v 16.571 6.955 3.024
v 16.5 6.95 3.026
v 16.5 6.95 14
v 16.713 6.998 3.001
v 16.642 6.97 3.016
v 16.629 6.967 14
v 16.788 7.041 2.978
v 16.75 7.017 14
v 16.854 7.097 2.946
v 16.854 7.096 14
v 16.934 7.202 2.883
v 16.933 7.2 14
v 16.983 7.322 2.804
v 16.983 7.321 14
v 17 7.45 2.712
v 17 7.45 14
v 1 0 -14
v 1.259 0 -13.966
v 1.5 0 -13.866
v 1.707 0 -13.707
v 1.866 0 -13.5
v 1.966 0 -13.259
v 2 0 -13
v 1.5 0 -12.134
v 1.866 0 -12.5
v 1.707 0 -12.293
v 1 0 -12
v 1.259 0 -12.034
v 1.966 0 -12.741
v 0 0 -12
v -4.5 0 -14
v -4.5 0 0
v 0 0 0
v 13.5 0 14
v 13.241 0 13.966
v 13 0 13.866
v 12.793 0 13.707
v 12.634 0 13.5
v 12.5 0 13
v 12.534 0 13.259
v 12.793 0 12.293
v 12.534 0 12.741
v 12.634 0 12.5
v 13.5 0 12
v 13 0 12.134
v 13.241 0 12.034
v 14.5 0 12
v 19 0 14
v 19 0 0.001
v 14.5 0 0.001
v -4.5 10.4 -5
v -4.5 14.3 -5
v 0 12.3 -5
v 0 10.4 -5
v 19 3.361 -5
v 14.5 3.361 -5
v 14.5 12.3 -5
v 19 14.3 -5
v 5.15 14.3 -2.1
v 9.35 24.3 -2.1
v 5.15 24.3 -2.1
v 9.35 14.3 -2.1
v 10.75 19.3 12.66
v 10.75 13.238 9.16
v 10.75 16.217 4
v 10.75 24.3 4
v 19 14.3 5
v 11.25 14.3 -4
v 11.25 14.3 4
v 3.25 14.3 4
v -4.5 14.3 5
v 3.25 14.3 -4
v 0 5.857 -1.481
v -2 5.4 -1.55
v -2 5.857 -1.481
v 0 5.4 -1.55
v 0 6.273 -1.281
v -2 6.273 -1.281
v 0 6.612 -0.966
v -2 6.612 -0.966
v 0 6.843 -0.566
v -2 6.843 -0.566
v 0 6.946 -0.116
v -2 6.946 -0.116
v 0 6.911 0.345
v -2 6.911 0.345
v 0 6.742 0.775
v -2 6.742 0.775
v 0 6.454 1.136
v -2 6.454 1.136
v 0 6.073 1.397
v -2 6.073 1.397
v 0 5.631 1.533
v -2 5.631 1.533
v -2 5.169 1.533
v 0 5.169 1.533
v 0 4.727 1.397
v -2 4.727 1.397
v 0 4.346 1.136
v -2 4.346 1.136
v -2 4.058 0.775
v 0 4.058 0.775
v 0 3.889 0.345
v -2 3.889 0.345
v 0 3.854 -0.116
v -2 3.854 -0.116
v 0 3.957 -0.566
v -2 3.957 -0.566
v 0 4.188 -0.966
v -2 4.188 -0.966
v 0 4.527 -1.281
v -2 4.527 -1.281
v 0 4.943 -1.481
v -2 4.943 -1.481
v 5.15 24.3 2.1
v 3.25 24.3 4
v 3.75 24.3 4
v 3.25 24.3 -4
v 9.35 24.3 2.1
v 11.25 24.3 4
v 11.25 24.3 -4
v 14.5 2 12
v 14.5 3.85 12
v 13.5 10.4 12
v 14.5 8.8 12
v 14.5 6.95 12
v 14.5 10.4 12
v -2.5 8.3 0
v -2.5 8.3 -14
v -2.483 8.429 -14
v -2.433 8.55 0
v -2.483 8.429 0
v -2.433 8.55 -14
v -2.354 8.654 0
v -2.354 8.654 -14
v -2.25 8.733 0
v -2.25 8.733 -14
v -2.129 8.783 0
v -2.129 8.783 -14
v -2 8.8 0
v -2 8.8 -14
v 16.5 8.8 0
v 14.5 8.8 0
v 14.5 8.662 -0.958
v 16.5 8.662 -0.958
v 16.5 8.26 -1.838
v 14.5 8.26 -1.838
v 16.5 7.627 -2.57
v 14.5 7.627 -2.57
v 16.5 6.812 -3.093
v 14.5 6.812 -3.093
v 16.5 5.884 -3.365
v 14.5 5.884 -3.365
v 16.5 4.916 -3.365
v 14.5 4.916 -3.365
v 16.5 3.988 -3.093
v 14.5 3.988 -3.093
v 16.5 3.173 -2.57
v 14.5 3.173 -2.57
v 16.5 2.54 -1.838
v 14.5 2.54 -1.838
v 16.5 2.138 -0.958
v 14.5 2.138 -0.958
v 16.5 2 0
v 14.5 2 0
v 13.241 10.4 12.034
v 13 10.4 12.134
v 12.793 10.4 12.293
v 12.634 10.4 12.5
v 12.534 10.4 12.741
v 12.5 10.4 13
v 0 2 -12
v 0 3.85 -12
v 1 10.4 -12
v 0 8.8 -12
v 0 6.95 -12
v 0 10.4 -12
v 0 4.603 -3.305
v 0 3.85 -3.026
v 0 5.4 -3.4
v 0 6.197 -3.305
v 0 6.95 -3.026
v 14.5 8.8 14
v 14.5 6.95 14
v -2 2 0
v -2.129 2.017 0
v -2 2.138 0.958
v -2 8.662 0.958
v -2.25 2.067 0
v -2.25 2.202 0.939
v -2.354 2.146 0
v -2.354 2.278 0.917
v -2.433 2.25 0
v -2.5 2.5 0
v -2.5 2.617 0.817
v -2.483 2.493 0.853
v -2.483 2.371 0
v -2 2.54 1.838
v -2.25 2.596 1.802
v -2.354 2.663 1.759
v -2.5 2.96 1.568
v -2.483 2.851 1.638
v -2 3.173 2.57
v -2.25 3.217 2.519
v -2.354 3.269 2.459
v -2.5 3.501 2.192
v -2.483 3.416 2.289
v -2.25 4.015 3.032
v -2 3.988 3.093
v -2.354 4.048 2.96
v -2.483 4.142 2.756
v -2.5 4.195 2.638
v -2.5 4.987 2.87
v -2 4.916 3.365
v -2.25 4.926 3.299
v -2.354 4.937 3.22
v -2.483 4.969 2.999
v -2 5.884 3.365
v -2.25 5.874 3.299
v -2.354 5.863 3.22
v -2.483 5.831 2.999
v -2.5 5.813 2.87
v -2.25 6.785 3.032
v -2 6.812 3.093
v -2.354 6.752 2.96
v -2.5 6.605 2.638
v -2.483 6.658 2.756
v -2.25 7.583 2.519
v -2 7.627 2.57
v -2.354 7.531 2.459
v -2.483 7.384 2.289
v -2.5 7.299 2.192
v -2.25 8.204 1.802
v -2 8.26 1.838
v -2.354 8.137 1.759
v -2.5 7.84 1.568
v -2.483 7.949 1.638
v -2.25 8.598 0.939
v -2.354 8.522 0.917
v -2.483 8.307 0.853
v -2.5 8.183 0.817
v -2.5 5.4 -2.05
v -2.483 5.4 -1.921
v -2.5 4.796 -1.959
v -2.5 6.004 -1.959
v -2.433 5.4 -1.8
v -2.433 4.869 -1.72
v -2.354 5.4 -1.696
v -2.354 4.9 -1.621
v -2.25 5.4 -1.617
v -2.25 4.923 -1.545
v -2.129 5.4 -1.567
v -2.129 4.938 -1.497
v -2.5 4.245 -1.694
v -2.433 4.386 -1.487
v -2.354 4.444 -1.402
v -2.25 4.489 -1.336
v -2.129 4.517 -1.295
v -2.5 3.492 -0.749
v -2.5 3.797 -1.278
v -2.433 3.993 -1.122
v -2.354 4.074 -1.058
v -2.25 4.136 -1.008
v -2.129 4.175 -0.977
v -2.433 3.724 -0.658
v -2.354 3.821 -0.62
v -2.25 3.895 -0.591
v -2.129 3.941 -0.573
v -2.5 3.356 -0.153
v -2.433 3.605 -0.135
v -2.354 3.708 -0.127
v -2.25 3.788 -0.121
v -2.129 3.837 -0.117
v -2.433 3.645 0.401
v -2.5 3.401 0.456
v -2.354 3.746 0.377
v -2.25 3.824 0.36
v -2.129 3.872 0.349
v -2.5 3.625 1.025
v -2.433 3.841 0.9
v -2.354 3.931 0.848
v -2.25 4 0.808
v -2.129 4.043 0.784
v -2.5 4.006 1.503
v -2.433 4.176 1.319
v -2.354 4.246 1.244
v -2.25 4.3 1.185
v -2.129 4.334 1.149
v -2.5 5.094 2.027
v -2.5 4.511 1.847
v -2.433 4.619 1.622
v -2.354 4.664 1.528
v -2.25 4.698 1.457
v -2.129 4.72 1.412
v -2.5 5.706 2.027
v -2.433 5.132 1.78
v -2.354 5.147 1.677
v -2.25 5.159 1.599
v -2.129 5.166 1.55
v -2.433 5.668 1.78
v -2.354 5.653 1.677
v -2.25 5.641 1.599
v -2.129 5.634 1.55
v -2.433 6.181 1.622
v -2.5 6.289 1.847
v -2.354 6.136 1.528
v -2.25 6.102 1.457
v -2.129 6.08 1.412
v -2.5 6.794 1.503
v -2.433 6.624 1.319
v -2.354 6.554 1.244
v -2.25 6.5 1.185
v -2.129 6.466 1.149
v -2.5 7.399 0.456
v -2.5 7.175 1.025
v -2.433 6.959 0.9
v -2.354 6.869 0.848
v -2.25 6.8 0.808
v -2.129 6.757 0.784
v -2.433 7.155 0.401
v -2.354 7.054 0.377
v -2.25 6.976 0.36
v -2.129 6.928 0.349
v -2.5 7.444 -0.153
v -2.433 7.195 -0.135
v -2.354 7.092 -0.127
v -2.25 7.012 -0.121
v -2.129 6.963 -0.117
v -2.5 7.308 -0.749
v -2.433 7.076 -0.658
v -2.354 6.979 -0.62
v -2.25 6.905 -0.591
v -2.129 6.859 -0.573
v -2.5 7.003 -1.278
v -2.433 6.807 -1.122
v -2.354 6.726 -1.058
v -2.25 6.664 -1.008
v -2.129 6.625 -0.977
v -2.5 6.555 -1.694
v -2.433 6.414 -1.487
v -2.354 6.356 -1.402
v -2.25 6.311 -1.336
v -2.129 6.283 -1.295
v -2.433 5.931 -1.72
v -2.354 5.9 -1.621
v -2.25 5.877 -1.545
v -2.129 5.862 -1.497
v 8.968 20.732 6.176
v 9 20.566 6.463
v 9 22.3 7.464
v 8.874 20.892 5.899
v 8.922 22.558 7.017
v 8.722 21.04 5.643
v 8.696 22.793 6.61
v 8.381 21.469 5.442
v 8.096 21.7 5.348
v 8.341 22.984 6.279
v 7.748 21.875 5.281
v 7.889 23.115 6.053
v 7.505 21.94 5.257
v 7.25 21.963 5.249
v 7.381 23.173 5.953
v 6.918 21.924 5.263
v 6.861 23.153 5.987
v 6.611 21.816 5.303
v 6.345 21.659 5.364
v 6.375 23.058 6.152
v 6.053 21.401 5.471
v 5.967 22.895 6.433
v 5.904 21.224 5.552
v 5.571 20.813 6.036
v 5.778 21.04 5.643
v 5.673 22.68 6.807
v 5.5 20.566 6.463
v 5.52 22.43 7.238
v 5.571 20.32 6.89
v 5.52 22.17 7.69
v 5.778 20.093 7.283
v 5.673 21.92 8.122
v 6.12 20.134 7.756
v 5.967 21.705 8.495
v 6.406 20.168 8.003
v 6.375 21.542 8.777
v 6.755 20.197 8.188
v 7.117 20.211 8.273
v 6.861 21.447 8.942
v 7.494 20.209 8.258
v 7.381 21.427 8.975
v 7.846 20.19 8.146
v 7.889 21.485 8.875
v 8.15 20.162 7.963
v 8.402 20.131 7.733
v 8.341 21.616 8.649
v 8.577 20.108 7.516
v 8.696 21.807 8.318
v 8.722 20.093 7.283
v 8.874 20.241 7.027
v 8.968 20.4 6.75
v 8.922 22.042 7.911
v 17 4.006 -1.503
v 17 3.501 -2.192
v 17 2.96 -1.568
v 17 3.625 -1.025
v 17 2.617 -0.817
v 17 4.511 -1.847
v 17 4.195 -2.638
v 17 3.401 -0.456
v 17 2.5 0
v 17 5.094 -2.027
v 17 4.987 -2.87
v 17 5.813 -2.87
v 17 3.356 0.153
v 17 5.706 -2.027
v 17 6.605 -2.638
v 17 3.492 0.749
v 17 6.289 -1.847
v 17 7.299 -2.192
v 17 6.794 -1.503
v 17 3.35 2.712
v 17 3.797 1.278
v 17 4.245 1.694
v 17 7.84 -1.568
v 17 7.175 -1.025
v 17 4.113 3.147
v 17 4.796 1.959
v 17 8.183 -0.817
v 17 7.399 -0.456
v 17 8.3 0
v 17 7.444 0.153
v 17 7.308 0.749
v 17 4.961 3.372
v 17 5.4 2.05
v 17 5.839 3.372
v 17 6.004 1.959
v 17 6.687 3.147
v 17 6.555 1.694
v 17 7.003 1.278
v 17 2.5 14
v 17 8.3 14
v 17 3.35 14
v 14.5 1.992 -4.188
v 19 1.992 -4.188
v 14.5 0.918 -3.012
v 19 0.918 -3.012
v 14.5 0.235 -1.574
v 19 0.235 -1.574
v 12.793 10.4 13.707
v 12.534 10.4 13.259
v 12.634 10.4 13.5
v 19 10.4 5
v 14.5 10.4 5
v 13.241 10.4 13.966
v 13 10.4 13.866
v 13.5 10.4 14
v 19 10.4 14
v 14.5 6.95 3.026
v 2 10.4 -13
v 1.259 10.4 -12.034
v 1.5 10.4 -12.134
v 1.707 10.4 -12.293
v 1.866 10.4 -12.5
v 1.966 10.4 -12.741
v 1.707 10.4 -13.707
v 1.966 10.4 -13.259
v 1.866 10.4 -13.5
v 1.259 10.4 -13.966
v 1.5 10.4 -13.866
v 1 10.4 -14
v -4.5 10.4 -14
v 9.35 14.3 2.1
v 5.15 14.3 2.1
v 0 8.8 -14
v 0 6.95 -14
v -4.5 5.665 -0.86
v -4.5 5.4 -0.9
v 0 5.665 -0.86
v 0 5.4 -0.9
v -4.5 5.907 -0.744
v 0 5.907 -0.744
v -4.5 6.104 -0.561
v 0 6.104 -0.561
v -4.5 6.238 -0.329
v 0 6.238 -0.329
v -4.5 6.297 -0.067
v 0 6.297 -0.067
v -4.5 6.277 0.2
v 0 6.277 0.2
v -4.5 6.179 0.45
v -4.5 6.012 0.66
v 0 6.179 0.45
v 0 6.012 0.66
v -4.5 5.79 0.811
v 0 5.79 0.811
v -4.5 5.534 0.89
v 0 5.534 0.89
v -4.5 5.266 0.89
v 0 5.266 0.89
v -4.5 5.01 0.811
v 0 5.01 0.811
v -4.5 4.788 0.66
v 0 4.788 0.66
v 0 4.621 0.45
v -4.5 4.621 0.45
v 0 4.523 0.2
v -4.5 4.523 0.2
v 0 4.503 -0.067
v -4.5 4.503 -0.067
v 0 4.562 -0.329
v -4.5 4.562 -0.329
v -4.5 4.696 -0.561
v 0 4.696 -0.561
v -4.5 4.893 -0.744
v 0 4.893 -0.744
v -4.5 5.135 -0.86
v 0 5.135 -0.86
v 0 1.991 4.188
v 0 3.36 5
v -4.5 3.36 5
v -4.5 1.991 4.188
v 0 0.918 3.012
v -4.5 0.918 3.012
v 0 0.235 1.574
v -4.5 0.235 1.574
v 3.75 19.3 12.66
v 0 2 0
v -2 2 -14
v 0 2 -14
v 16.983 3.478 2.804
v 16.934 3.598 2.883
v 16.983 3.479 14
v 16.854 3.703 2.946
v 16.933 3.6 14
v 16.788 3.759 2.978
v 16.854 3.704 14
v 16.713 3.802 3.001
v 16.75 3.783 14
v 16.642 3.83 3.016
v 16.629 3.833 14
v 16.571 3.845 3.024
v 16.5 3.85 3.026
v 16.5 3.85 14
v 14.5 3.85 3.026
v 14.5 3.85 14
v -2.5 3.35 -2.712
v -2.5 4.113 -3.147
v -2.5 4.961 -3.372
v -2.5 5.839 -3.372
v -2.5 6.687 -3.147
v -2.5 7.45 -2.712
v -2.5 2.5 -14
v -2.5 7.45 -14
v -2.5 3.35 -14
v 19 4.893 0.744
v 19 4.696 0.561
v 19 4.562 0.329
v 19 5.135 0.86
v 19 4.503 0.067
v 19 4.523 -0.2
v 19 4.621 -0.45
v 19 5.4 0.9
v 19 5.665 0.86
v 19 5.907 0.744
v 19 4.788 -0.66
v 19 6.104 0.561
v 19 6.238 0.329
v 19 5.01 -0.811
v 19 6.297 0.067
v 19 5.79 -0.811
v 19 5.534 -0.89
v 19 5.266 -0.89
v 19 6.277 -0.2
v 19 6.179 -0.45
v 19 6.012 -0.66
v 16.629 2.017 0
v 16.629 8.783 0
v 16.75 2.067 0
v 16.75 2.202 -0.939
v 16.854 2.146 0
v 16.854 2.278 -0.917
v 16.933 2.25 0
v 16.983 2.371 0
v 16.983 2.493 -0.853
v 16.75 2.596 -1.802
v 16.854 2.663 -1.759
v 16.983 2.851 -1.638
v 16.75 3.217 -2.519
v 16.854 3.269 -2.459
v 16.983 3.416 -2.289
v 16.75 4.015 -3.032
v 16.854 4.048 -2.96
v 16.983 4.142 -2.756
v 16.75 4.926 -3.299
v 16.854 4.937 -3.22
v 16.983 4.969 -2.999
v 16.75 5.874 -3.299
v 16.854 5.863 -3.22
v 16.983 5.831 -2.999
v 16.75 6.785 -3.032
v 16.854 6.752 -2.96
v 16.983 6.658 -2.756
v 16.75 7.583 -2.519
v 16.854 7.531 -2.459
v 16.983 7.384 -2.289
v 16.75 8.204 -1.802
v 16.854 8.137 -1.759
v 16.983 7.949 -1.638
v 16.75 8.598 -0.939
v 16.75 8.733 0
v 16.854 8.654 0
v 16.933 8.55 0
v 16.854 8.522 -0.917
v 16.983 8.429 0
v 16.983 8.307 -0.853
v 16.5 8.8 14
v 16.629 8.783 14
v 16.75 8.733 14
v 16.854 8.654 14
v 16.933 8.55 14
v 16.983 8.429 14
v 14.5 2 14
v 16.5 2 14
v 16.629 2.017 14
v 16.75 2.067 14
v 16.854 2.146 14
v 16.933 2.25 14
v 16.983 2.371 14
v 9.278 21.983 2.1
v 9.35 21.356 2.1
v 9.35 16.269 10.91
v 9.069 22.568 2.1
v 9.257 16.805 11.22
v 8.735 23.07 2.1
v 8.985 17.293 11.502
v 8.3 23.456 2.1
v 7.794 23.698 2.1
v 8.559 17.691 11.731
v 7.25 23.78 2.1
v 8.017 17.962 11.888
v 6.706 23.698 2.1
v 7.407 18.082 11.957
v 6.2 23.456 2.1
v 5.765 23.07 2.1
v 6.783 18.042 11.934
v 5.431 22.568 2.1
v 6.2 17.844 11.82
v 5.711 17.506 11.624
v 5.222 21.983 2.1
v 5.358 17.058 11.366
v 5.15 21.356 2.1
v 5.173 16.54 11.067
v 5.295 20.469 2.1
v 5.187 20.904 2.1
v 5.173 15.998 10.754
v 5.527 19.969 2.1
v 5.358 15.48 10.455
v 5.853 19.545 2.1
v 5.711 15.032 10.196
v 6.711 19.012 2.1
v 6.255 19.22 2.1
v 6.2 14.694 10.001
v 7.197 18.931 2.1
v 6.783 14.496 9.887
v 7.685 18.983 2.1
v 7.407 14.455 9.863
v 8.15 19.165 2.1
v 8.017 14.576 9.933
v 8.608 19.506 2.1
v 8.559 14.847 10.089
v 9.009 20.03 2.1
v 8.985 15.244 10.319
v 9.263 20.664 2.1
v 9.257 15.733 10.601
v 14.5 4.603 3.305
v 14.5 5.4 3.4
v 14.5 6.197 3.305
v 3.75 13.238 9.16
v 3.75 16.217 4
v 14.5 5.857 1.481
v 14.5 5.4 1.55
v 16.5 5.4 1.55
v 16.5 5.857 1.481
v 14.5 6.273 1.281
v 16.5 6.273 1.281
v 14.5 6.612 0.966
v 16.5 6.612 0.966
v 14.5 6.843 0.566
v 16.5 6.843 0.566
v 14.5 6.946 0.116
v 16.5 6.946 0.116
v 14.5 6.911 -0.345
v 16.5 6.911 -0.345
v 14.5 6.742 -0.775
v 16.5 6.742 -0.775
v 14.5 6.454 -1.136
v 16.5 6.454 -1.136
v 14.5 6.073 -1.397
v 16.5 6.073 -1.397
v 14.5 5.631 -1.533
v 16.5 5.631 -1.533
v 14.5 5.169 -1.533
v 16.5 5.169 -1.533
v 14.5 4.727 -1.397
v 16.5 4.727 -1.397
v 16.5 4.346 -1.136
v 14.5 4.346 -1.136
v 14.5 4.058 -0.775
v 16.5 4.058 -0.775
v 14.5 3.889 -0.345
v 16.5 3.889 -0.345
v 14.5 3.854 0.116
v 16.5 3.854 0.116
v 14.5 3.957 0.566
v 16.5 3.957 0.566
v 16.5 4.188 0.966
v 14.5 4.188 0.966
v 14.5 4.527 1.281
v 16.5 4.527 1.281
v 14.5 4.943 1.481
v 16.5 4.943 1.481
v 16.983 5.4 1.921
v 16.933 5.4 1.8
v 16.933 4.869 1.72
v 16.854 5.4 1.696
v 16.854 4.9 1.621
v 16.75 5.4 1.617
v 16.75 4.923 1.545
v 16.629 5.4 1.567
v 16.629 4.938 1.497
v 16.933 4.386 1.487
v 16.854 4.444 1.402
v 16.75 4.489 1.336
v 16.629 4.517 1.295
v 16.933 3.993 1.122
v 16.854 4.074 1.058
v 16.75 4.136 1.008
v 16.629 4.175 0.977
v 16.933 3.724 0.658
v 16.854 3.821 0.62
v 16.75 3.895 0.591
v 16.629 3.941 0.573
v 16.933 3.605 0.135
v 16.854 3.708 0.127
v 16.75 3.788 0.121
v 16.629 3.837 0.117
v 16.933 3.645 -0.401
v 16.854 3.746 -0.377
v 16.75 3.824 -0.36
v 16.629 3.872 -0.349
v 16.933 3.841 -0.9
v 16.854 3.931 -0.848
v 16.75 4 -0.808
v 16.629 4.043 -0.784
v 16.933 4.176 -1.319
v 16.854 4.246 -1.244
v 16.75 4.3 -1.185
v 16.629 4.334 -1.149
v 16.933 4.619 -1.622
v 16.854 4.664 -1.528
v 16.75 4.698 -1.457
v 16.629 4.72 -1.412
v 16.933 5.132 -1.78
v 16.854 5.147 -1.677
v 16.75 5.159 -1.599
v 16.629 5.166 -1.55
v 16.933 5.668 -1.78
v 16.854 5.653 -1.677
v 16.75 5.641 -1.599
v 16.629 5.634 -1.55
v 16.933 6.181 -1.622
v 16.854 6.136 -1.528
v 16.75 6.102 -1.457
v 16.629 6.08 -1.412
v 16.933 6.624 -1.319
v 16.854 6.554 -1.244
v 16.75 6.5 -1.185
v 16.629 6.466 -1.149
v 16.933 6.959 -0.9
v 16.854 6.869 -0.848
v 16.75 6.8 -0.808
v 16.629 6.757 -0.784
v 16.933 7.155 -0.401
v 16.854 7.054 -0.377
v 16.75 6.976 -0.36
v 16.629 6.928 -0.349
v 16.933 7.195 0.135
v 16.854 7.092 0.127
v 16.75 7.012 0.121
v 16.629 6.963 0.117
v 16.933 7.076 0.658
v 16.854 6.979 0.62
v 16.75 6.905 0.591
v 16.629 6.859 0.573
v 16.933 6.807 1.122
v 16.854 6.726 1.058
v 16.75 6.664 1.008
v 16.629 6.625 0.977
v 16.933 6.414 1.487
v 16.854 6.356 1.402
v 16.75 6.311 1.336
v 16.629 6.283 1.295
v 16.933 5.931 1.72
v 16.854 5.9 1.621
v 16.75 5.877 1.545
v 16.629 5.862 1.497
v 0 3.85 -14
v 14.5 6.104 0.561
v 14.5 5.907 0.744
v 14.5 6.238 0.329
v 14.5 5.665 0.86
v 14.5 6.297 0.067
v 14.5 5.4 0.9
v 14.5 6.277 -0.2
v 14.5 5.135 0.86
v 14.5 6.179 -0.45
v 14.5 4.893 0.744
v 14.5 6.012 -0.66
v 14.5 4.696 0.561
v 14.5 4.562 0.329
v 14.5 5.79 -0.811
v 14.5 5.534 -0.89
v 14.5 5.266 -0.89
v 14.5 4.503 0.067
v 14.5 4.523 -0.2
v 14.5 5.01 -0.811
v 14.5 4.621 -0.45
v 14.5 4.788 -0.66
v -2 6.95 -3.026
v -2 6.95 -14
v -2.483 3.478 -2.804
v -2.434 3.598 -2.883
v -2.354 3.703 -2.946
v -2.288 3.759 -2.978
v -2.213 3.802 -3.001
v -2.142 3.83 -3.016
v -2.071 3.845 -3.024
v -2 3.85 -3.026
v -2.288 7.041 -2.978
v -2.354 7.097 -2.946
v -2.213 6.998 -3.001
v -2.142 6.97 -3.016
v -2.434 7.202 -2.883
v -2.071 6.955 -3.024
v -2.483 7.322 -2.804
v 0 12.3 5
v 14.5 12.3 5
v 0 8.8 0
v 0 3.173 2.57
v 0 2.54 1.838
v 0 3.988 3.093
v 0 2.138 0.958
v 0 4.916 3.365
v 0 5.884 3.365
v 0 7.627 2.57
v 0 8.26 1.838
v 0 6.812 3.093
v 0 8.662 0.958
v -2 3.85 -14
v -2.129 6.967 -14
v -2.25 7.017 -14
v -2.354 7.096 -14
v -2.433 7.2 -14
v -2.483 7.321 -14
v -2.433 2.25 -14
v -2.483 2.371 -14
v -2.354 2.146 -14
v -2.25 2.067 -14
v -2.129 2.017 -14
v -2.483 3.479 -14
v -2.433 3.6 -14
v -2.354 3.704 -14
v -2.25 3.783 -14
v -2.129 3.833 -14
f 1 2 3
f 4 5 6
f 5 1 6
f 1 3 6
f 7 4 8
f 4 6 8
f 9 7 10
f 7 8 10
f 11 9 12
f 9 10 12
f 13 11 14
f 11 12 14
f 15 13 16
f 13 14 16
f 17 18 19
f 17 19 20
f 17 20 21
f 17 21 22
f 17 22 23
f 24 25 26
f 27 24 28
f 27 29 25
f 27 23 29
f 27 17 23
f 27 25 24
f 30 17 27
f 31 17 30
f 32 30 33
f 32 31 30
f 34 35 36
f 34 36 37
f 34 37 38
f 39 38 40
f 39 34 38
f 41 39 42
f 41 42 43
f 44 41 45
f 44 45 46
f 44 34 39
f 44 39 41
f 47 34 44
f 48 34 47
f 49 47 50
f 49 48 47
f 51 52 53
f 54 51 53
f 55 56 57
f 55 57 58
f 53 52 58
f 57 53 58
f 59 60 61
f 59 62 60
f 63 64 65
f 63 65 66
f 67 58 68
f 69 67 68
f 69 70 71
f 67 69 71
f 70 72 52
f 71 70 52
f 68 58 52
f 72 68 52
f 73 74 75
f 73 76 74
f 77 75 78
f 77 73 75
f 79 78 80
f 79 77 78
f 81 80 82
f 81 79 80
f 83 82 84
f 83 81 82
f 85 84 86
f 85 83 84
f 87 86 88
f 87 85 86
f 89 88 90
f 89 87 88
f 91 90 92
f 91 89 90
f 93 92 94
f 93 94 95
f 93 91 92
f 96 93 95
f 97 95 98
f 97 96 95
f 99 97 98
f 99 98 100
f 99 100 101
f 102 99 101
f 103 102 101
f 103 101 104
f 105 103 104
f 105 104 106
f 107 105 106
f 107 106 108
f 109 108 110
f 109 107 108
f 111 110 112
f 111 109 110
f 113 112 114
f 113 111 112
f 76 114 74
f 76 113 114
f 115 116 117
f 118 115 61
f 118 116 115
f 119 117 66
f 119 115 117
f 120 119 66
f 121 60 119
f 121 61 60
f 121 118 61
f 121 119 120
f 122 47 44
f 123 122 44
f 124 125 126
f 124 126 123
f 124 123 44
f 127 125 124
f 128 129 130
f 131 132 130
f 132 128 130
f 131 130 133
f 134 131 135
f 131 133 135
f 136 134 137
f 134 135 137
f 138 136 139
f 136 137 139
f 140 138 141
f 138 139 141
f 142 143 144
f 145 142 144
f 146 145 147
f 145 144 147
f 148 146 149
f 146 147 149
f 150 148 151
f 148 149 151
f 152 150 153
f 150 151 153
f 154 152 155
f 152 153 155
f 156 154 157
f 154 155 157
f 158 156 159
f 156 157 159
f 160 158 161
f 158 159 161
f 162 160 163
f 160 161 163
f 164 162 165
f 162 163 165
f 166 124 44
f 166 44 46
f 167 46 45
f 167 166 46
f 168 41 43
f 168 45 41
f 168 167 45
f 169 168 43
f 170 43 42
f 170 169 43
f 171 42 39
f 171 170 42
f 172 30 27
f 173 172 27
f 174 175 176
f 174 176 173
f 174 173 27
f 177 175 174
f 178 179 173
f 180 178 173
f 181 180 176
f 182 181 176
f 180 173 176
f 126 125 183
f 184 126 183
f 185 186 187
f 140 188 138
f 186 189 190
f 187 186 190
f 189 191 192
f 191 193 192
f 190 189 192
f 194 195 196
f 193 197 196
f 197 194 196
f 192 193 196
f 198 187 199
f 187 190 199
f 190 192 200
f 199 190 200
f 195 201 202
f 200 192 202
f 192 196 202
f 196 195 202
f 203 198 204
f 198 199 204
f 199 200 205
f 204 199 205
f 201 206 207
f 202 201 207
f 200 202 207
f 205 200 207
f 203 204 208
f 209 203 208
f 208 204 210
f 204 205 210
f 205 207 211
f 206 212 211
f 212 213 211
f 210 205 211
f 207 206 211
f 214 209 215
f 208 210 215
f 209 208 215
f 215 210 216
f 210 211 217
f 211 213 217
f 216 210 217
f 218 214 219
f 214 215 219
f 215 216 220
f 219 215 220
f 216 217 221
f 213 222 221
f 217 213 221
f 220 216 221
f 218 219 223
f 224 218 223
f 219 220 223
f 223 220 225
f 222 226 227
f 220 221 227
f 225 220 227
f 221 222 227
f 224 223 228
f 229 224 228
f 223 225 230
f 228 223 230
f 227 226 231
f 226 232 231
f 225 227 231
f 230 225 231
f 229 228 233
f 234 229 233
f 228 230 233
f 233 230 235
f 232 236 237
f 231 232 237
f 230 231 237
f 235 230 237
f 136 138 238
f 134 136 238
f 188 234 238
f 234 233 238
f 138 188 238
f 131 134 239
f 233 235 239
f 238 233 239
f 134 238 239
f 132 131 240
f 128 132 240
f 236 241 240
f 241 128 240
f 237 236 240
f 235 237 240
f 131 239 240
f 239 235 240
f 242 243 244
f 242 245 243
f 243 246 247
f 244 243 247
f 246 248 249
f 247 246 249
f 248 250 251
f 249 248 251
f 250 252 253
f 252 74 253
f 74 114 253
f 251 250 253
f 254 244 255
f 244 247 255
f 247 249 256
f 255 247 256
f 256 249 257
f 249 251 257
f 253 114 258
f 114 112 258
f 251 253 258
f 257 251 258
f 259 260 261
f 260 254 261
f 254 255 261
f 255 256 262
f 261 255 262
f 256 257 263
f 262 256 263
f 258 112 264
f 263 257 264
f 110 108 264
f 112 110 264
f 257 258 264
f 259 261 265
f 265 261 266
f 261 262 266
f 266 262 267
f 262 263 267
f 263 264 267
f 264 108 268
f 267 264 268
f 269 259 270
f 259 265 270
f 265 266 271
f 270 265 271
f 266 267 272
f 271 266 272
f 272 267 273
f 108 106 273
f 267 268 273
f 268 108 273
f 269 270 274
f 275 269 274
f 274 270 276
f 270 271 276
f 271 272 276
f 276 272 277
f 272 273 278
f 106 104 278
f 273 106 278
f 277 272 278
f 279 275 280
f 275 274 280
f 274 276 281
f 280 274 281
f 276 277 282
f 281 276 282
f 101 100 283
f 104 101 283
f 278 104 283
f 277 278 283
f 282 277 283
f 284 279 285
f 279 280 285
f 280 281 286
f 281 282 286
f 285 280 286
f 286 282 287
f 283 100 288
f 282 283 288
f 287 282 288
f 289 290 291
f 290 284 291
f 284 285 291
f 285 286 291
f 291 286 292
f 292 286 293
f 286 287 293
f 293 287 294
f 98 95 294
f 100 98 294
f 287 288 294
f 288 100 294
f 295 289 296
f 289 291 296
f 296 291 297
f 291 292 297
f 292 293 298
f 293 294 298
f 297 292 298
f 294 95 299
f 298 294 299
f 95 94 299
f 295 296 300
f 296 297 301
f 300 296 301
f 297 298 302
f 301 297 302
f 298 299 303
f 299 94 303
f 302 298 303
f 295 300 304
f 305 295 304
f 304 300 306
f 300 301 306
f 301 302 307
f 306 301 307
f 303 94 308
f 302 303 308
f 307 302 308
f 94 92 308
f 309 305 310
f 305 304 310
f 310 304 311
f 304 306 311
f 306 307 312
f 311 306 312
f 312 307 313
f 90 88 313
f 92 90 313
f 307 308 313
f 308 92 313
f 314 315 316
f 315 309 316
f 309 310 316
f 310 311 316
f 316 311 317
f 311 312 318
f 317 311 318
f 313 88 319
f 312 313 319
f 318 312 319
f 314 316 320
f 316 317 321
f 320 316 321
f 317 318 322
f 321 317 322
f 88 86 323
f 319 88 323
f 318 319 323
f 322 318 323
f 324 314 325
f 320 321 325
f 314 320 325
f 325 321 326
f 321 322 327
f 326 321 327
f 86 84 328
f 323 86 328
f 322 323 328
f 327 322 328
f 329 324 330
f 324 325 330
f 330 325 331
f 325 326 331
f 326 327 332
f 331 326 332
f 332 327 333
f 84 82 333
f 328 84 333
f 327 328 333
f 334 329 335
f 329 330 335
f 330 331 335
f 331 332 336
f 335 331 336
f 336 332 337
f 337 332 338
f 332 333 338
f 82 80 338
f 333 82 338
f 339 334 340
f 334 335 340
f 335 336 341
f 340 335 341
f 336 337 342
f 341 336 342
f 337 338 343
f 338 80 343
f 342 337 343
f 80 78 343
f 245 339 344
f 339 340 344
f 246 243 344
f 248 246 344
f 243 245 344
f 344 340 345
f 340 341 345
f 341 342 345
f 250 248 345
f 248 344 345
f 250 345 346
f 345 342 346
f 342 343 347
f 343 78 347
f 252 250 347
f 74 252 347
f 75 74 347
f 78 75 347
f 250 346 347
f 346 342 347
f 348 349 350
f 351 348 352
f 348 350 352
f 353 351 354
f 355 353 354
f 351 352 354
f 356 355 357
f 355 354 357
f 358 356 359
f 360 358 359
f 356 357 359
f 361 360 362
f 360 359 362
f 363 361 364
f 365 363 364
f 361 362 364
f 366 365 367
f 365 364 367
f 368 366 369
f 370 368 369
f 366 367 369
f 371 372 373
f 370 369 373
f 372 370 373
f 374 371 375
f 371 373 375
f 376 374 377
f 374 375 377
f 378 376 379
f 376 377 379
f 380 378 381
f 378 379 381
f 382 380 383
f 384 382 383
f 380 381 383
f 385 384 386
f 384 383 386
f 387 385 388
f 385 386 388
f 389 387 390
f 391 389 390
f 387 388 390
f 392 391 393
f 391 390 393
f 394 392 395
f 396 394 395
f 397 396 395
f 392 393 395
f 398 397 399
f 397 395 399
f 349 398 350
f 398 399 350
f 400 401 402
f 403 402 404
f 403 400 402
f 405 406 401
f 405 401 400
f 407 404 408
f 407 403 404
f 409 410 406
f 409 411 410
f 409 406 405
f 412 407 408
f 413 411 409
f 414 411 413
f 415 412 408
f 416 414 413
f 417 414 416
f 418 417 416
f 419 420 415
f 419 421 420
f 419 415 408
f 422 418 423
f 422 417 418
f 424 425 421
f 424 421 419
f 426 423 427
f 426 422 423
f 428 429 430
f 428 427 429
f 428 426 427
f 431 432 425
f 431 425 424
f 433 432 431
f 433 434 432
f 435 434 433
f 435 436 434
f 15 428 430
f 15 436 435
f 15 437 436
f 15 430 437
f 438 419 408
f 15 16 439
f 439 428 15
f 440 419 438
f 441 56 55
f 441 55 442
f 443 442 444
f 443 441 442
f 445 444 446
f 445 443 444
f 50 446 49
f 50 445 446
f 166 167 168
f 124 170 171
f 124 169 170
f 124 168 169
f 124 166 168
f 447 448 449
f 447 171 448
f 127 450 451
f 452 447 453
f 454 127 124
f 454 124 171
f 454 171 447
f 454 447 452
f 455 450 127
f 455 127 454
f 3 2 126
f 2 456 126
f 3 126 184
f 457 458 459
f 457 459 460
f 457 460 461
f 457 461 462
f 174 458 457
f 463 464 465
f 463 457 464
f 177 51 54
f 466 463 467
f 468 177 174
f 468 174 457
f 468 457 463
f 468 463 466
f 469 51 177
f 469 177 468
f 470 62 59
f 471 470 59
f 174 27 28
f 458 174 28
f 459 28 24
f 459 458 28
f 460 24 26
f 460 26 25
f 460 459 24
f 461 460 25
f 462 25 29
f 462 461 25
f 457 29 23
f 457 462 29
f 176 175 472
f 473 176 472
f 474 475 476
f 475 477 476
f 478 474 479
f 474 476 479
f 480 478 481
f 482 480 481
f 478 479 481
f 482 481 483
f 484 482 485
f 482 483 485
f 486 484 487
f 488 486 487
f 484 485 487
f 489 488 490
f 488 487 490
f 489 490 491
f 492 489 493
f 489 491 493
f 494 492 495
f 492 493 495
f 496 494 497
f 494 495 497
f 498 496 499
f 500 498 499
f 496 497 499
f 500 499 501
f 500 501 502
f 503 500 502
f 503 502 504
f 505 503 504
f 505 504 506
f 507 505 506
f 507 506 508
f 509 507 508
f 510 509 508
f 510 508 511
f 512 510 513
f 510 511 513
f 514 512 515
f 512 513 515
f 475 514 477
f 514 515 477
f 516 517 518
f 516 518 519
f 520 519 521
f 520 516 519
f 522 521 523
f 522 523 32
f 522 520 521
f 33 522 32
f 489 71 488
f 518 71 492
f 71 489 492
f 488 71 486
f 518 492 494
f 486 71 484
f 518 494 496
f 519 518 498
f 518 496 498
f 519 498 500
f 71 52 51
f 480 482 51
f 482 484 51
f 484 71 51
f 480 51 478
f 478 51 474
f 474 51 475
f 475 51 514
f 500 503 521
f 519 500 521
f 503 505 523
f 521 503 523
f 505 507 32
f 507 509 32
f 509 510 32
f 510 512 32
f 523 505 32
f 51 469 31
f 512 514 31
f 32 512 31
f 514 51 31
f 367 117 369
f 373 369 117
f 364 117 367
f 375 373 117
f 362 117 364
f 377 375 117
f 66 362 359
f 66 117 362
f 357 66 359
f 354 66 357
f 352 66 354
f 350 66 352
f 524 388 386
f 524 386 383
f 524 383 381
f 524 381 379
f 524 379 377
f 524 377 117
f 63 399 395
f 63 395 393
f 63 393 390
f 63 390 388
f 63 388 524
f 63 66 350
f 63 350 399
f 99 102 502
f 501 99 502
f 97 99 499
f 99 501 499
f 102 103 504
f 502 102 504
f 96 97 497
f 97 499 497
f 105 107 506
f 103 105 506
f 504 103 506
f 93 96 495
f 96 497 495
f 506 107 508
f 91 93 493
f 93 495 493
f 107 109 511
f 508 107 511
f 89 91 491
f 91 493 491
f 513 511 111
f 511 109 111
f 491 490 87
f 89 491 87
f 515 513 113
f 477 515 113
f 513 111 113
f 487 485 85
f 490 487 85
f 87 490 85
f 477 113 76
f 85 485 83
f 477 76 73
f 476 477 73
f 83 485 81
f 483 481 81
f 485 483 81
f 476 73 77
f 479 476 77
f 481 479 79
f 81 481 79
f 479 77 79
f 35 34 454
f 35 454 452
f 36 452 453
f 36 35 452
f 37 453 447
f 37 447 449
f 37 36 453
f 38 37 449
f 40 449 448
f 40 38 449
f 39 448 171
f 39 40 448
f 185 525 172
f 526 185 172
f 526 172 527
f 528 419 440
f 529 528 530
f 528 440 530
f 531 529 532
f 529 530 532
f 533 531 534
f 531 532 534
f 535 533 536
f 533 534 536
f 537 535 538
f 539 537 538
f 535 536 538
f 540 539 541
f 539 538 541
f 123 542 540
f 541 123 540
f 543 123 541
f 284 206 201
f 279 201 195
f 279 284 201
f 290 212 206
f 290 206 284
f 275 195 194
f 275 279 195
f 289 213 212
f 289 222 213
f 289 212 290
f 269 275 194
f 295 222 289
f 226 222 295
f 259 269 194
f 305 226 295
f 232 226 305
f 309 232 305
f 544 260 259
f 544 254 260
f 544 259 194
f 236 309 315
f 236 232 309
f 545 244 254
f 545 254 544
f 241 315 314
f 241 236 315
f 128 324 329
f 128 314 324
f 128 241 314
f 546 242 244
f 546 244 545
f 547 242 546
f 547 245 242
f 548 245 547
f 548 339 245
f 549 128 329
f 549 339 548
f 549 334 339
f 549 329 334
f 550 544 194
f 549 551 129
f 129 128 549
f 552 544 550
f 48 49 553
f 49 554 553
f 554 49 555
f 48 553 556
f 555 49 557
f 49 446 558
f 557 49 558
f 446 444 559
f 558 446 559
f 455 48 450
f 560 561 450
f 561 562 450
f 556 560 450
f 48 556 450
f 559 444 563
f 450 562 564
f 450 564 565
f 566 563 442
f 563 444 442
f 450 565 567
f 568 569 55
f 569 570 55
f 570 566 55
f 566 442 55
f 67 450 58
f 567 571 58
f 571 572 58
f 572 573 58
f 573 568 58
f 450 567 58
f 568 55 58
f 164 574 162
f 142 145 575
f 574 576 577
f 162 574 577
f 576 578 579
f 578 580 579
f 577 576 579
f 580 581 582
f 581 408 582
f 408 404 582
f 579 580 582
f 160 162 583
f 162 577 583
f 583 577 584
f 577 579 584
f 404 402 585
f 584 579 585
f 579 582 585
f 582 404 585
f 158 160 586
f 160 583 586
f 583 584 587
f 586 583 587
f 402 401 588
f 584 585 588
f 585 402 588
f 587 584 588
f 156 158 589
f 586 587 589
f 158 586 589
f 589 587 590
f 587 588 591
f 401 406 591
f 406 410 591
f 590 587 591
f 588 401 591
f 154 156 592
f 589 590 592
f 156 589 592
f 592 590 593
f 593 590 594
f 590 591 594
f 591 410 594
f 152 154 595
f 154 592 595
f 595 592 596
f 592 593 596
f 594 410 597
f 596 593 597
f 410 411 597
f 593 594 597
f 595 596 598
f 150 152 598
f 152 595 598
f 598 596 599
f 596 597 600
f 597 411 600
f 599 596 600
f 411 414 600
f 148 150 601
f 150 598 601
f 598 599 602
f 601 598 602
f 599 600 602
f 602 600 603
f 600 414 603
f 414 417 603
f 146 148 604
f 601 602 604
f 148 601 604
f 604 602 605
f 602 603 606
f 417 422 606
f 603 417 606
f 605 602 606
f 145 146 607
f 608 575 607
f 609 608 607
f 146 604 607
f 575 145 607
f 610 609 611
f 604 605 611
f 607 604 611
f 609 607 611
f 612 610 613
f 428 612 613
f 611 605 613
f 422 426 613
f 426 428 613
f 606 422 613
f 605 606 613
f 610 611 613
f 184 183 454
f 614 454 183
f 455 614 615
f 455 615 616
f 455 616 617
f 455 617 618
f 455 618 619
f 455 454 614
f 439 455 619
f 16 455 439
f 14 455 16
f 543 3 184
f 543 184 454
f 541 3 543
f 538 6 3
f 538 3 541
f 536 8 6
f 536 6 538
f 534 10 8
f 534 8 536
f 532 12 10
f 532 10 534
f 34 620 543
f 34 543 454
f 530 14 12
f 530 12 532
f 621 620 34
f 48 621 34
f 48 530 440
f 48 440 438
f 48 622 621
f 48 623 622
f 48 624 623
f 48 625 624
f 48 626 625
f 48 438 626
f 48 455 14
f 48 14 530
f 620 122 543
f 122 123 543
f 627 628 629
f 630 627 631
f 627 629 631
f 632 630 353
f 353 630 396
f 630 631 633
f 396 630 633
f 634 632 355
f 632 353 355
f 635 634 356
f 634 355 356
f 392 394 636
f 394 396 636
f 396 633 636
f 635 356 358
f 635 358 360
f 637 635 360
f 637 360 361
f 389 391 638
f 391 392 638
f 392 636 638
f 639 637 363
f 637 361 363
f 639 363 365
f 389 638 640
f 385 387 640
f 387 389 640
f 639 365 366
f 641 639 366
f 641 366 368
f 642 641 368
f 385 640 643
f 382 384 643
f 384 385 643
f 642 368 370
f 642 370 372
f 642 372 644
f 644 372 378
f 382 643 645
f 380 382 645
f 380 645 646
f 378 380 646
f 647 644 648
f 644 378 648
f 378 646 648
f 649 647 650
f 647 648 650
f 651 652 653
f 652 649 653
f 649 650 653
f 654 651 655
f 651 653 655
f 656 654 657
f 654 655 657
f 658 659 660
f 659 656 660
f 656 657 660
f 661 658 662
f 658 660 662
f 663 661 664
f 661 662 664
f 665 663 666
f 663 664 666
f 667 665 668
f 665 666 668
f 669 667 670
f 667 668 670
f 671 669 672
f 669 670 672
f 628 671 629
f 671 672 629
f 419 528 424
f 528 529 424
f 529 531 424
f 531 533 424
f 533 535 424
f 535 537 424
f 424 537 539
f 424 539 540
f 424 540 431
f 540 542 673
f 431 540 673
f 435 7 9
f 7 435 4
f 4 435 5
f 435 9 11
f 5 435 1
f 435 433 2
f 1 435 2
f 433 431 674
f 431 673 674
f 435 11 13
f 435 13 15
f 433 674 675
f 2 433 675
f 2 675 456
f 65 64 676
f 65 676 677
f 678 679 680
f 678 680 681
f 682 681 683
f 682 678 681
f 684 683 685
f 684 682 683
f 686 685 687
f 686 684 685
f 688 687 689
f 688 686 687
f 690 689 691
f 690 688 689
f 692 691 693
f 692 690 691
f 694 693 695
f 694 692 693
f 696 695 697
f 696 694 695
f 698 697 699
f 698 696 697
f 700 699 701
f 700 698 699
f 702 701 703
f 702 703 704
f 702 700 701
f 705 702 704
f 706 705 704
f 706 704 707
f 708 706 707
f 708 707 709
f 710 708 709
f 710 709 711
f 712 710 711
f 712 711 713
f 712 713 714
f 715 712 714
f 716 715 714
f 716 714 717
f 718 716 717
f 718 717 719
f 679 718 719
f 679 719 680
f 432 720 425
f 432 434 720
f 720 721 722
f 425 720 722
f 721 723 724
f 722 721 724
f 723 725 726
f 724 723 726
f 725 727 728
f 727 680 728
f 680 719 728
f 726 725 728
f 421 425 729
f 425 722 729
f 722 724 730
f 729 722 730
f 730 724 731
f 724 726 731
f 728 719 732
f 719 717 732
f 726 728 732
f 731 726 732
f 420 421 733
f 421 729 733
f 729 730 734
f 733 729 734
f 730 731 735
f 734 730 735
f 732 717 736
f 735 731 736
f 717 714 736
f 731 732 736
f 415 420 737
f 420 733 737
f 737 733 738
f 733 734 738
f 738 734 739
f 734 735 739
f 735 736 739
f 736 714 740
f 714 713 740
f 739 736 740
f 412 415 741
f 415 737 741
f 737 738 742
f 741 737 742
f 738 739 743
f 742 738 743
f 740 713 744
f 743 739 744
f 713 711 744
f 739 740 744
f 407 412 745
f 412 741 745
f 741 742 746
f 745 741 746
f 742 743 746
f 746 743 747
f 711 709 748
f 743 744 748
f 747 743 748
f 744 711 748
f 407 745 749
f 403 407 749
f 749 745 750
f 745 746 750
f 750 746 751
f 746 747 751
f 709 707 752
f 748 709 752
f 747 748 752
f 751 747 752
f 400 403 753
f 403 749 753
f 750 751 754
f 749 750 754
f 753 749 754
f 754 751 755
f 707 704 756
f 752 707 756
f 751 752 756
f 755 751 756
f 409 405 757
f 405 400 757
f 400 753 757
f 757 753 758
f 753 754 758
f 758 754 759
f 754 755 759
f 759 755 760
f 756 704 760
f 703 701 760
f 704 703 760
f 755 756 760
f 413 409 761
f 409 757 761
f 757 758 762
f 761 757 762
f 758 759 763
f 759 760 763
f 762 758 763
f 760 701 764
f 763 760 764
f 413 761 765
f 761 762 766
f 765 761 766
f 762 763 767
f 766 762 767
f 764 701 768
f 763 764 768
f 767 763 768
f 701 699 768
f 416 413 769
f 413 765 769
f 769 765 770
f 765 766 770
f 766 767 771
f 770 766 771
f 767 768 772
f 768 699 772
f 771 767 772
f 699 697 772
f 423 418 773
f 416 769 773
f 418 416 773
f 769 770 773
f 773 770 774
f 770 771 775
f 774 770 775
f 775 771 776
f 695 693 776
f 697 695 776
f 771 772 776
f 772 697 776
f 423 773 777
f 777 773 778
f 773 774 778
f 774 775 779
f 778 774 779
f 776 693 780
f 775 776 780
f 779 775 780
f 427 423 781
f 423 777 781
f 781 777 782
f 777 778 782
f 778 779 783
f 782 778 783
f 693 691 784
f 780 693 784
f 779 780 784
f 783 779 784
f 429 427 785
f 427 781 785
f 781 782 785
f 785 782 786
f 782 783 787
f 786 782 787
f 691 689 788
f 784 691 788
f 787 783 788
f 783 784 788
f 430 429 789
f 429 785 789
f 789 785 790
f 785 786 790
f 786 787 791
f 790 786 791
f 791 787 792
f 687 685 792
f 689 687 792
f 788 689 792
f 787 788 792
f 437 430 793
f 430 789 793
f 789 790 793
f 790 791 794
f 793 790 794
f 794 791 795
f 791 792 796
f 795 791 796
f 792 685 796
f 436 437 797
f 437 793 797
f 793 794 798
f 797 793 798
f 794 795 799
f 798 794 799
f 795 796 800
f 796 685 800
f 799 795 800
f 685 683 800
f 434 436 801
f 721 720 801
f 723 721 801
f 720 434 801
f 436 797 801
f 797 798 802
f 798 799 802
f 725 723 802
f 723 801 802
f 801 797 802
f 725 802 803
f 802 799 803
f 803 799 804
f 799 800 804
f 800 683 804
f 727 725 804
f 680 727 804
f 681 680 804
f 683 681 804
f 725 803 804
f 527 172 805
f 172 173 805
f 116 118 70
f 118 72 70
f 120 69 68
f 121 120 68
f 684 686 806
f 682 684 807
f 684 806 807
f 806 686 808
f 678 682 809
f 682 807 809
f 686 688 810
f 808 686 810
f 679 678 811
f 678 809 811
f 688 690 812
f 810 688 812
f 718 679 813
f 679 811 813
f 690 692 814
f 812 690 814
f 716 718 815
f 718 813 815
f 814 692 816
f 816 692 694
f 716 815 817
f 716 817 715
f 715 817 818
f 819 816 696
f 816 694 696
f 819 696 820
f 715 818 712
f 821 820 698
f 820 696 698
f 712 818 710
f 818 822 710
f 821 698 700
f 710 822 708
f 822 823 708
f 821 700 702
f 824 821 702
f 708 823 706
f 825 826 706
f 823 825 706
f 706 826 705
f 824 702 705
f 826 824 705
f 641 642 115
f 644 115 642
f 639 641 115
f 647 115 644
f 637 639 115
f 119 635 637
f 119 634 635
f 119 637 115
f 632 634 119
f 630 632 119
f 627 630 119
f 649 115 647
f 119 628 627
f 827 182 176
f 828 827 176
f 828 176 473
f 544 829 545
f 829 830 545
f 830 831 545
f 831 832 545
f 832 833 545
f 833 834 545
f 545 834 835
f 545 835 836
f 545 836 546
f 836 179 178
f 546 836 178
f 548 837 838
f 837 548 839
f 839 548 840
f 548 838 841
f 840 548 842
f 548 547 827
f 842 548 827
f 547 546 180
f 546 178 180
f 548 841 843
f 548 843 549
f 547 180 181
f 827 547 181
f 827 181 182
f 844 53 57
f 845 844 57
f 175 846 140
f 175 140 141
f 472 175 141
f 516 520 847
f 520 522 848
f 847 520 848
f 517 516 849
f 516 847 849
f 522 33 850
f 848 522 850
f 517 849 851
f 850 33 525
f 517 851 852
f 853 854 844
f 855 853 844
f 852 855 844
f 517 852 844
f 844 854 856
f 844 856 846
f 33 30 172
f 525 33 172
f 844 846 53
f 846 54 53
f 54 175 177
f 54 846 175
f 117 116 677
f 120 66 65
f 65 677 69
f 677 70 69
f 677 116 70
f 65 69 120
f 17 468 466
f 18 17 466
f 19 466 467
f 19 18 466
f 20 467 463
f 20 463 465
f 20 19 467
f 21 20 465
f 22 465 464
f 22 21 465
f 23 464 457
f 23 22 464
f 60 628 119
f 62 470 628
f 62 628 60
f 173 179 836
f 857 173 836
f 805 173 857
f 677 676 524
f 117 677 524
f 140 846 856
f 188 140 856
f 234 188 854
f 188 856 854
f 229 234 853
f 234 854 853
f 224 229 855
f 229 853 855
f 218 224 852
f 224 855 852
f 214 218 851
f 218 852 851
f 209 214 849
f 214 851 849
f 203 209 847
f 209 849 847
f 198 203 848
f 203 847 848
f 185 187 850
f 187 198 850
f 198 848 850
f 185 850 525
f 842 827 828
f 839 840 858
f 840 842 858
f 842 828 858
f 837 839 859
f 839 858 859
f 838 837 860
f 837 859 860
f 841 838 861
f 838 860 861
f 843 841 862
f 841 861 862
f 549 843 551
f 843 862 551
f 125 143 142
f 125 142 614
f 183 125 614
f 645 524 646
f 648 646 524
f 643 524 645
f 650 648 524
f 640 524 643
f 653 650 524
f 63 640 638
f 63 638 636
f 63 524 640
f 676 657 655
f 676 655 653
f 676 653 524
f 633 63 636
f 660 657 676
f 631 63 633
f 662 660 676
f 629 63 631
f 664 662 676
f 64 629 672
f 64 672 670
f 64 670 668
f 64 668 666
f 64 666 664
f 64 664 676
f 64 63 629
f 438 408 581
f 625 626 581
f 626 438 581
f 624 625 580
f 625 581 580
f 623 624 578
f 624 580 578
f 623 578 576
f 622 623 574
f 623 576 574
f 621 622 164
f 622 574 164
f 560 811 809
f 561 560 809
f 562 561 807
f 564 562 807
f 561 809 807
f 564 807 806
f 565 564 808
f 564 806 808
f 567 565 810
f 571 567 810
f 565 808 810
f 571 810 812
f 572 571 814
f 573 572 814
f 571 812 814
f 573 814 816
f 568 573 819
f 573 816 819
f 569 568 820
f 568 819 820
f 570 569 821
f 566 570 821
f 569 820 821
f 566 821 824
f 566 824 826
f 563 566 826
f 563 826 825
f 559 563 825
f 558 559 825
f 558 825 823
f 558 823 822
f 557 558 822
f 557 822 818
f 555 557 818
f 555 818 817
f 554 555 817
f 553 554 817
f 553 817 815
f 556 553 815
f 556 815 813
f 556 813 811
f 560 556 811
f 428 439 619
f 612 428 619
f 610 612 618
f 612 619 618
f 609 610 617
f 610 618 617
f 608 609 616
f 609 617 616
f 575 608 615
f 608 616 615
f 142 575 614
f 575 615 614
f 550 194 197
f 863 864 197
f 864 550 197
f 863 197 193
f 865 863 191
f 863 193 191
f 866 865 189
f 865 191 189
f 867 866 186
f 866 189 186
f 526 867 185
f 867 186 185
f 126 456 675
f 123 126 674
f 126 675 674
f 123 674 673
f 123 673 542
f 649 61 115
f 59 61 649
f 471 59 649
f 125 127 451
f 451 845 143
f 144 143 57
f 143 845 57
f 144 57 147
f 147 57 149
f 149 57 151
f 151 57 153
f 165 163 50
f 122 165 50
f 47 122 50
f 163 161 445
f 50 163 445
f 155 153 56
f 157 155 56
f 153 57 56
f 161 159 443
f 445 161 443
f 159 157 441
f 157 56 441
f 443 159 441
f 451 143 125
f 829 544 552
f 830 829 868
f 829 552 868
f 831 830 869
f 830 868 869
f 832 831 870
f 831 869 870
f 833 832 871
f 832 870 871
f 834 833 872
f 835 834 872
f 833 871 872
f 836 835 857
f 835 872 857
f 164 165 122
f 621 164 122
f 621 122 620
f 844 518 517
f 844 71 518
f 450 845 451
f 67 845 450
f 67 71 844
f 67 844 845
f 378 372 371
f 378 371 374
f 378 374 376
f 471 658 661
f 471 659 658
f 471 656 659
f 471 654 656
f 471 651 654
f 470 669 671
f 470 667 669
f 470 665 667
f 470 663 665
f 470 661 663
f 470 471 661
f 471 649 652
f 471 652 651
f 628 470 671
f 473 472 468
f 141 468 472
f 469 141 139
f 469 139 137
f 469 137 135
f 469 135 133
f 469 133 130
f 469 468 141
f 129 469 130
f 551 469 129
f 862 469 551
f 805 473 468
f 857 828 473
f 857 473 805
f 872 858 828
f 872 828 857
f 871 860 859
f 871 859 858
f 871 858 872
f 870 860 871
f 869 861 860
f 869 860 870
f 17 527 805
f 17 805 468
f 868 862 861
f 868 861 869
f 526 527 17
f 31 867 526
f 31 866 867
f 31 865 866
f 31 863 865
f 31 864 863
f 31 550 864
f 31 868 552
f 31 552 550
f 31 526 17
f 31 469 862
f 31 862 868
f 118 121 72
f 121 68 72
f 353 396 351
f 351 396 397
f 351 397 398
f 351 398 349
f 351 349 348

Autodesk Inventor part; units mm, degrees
ref_plane "XZ Plane" through (0, 0, 0) normal (0, 1, 0) x (-1, 0, 0)
ref_plane "XY Plane" through (0, 0, 0) normal (0, 0, 1) x (1, 0, 0)
sketch "Sketch1" plane through (0, 0, 0) normal (0, 0, 1) x (1, 0, 0)
  line L0 (0, 0) -> (0, 12.3)
  line L1 (0, 12.3) -> (14.5, 12.3)
  line L2 (14.5, 12.3) -> (14.5, 0)
  line L3 (14.5, 0) -> (19, 0)
  line L4 (19, 0) -> (19, 14.3)
  line L5 (19, 14.3) -> (-4.5, 14.3)
  line L6 (-4.5, 14.3) -> (-4.5, 0)
  line L7 (-4.5, 0) -> (0, 0)
  dimension "d6" = 12.3
  dimension "d7" = 14.5
  dimension "d8" = 4.5
  dimension "d9" = 14.3
  dimension "d10" = 23.5
  dimension "d108" = 12.3
  dimension "d205" = 4.5
extrude "Extrusion1" add sketch "Sketch1" along normal mid plane 10
sketch "Sketch2" plane through (-4.5, 14.3, 5) normal (0, 1, 0) x (1, 0, 0)
  line L0 (0, 10) -> (0, 0) projected
  line L1 (0, 10) -> (23.5, 10) projected
  line L2 (0, 0) -> (23.5, 10)
  line L3 (23.5, 0) -> (0, 0) projected
  line L4 (0, 10) -> (23.5, 0)
  line L5 (9.65, 2.9) -> (13.85, 2.9)
  line L6 (13.85, 2.9) -> (13.85, 7.1)
  line L7 (13.85, 7.1) -> (9.65, 7.1)
  line L8 (9.65, 7.1) -> (9.65, 2.9)
  line L9 (9.65, 2.9) -> (13.85, 7.1) construction
  line L10 (13.85, 2.9) -> (9.65, 7.1) construction
  line L11 (7.75, 1) -> (15.75, 1)
  line L12 (15.75, 1) -> (15.75, 9)
  line L13 (15.75, 9) -> (7.75, 9)
  line L14 (7.75, 9) -> (7.75, 1)
  line L15 (7.75, 1) -> (15.75, 9) construction
  line L16 (15.75, 1) -> (7.75, 9) construction
  point P0 (4.5, 5)
  point P1 (11.75, 5)
  dimension "d11" = 4.2
  dimension "d12" = 4.2
  dimension "d13" = 8
  dimension "d14" = 8
extrude "Extrusion2" add sketch "Sketch2" along normal blind 10 contours L14 L13 L12 L2 L6 L7 L8 L4 | L4 L8 L2 L14 | L2 L8 L5 L6 L4 L12 L11 L14 | L12 L4 L6 L2
sketch "Sketch3" plane through (0, 0, 5) normal (1, 0, 0) x (0, 0, -1)
  line L0 (10, 0) -> (0, 0) projected
  line L1 (0, 0) -> (5, 0)
  line L2 (10, 14.3) -> (0, 14.3) projected
  line L3 (6.95, 14.3) -> (3.05, 14.3)
  line L4 (5, 0) -> (5, 2)
  line L5 (8.4, 5.4) -> (17.767, 5.4) construction
  line L6 (6.8, 5.4) -> (16.167, 5.4) construction
  line L7 (1.6, 5.4) -> (10.967, 5.4) construction
  line L8 (3.2, 5.4) -> (12.567, 5.4) construction
  line L9 (5, 5.4) -> (5, 0)
  line L10 (5, 8.8) -> (5, 10.4)
  line L11 (5, 10.4) -> (19, 10.4)
  line L12 (5, 0) -> (19, 0)
  line L13 (19, 0) -> (19, 10.4)
  line L14 (5, 8.8) -> (5, 0)
  point P0 (1.9, 14.3)
  point P1 (8.1, 14.3)
  point P2 (10, 0)
  dimension "d17" = 5
  dimension "d111" = 2
  dimension "d172" = 1.6
  dimension "d173" = 14
  dimension "d174" = 14
extrude "Extrusion3" add sketch "Sketch3" against normal blind 4.5
ref_plane "Work Plane1" through (10.75, 0, 0) normal (1, 0, 0) x (0, 1, 0)
sketch "Sketch15" plane through (10.75, 0, 0) normal (1, 0, 0) x (0, 1, 0)
  line L0 (24.3, -4) -> (24.3, 4) projected
  line L1 (24.3, 4) -> (19.3, 12.6603)
  line L2 (24.3, 4) -> (34.3, 4) construction
  line L3 (24.3, 4) -> (16.3, 4)
  line L4 (14.3, 4) -> (24.3, 4) projected
  line L5 (19.3, 12.6603) -> (13.2378, 9.1603)
  line L6 (13.2378, 9.1603) -> (16.2171, 4)
  line L7 (13.2378, 9.1603) -> (19.1964, 9.1603) construction
  point P0 (0, 0)
  point P1 (18.5265, 4)
  dimension "d83" = 10
  dimension "d84" = 120
  dimension "d85" = 8
  dimension "d93" = 7
  dimension "d94" = 60
extrude "Extrusion13" add sketch "Sketch15" against normal blind 7
sketch "Sketch17" plane through (3.75, 19.3, 12.6603) normal (0, -0.5, 0.866) x (1, 0, 0)
  line L0 (7, -7) -> (0, -7) projected
  line L1 (0, 0) -> (3.5, 0)
  line L2 (3.5, 0) -> (3.5, -3.5)
  circle A0 centre (3.5, -3.5) radius 2.1
  point P0 (-3.75, -23.0444)
  point P1 (0.25, -7)
  point P2 (6.5, -7)
  dimension "d119" = 3.5
  dimension "d120" = 3.5
  dimension "d121" = 4.2
extrude "Extrusion15" cut sketch "Sketch17" against normal blind 13
sketch "Sketch22" plane through (14.5, 0, 5) normal (-1, 0, 0) x (0, 0, 1)
  line L0 (-10, 0) -> (0, 0) projected
  line L1 (0, 0) -> (-5, 0)
  line L2 (-5, 0) -> (0.4, 0) construction
  line L3 (9, 8.8) -> (9, 0)
  line L4 (9, 0) -> (-5, 0)
  line L5 (9, 9.4295) -> (9, 0)
  line L6 (-5, 10.4) -> (9, 10.4)
  line L7 (9, 10.4) -> (9, 9.4295)
  line L8 (-5, 10.4) -> (-5, 0)
  point P0 (0, 0)
extrude "Extrusion20" add sketch "Sketch22" against normal blind 4.5
sketch "Sketch23" plane through (14.5, 0, -5) normal (-1, 0, 0) x (0, 0, 1)
  line L0 (0, 14.3) -> (0, 0) projected
  line L1 (0, 0) -> (5, 0)
  line L2 (0, 0) -> (19, 0) projected
  line L3 (5, 0) -> (5, 5.4)
  circle A0 centre (5, 5.4) radius 1.55
  circle A1 centre (5, 5.4) radius 3.4
  line L4 (5, 2) -> (20, 2)
  line L5 (5, 3.85) -> (20, 3.85)
  line L6 (5, 6.95) -> (20, 6.95)
  line L7 (5, 8.8) -> (20, 8.8)
  line L8 (20, 8.8) -> (20, 6.95)
  line L9 (20, 3.85) -> (20, 2)
  point P0 (8.0261, 3.85)
  point P1 (8.0261, 6.95)
  dimension "d161" = 5.4
  dimension "d162" = 3.1
  dimension "d163" = 6.8
  dimension "d164" = 15
  dimension "d165" = 15
  dimension "d166" = 15
extrude "Extrusion21" cut sketch "Sketch23" against normal blind 2.5 contours A1 L6 A0 L3 | L3 L5 A1 | A1 L5 L9 L4 | A0 L6 A1 L5 | L7 L8 L6 A1
sketch "Sketch24" plane through (14.5, 5.4, 0) normal (-1, 0, 0) x (0, 0, 1)
  circle A0 centre (0, 0) radius 0.9
  point P0 (0, -5.4)
  dimension "d169" = 1.8
extrude "Extrusion22" cut sketch "Sketch24" against normal through all
sketch "Sketch25" plane through (0, 0, 5) normal (1, 0, 0) x (0, 0, -1)
  line L0 (19, 0) -> (0, 0) projected
  line L1 (0, 0) -> (5, 0)
  line L2 (5, 0) -> (5, 5.4)
  line L3 (5, 0) -> (10.4, 0) construction
  circle A0 centre (5, 5.4) radius 1.55
  circle A1 centre (5, 5.4) radius 3.4
  line L4 (5, 8.8) -> (20, 8.8)
  line L5 (5, 6.95) -> (20, 6.95)
  line L6 (5, 3.85) -> (20, 3.85)
  line L7 (5, 2) -> (20, 2)
  line L8 (20, 2) -> (20, 3.85)
  line L9 (20, 6.95) -> (20, 8.8)
  point P0 (8.0261, 6.95)
  point P1 (8.0261, 3.85)
  dimension "d175" = 5.4
  dimension "d176" = 90
  dimension "d177" = 3.1
  dimension "d178" = 6.8
  dimension "d179" = 15
  dimension "d180" = 15
  dimension "d181" = 15
  dimension "d182" = 15
extrude "Extrusion23" cut sketch "Sketch25" against normal blind 2.5 contours A1 L5 A0 L2 | L2 L6 A1 | A1 L6 L8 L7 | A0 L5 A1 L6 | L4 L9 L5 A1
sketch "Sketch26" plane through (0, 5.4, 0) normal (1, 0, 0) x (0, 0, -1)
  circle A0 centre (0, 0) radius 0.9
  point P0 (0, -5.4)
  dimension "d185" = 1.8
extrude "Extrusion24" cut sketch "Sketch26" against normal through all
sketch "Sketch27" plane through (0, 5.4, 0) normal (1, 0, 0) x (0, 0, -1)
  circle A0 centre (0, 0) radius 0.9 projected
  arc A1 (-5, -2.0396) -> (0, -5.4) centre (0, 0) ccw
  line L0 (-5, 8.9) -> (-5, -5.4) projected
  line L1 (-5, -2.0396) -> (-5, -5.4)
  line L2 (-5, -5.4) -> (0, -5.4)
extrude "Extrusion25" cut sketch "Sketch27" against normal through all contours A1 L2 L0
sketch "Sketch28" plane through (14.5, 5.4, 0) normal (-1, 0, 0) x (0, 0, 1)
  arc A0 (-5, -2.0388) -> (0.0007, -5.4) centre (0.0003, 0) ccw
  line L0 (-5, 8.9) -> (-5, -5.4) projected
  line L1 (-5, -2.0388) -> (-5, -5.4)
  line L2 (-5, -5.4) -> (0, -5.4)
extrude "Extrusion26" cut sketch "Sketch28" against normal through all
fillet "Fillet9" radius 0.5 12 edges at (17, 8.8, 7) (17, 2, 7) (17, 5.4, -3.4) (17, 5.4, -1.55) (17, 6.95, 8.5131) (17, 3.85, 8.5131) (-2.5, 8.8, -7) (-2.5, 2, -7) (-2.5, 5.4, 3.4) (-2.5, 6.95, -8.5131) (-2.5, 3.85, -8.5131) (-2.5, 5.4, 1.55)
sketch "Sketch29" plane through (0, 3.85, -14) normal (1, 0, 0) x (0, 0, -1)
  line L0 (0, 6.55) -> (0, -3.85) projected
  line L1 (0, -3.85) -> (-2, -3.85)
  line L2 (0, -3.85) -> (-14, -3.85) projected
  line L3 (-2, -3.85) -> (-2, 6.55)
  line L4 (-9, 6.55) -> (0, 6.55) projected
  line L5 (-2, 6.55) -> (0, 6.55)
  line L6 (0, -3.85) -> (0, 6.55)
  dimension "d193" = 2
extrude "Extrusion27" add sketch "Sketch29" along normal blind 2
sketch "Sketch30" plane through (14.5, 3.85, 14) normal (-1, 0, 0) x (0, 0, 1)
  line L0 (0, 6.55) -> (0, -3.85) projected
  line L1 (0, -3.85) -> (-2, -3.85)
  line L2 (-14, -3.85) -> (0, -3.85) projected
  line L3 (-2, -3.85) -> (-2, 6.55)
  line L4 (-9, 6.55) -> (0, 6.55) projected
  line L5 (0, 6.55) -> (0, -3.85)
  dimension "d196" = 2
extrude "Extrusion28" add sketch "Sketch30" along normal blind 2
fillet "Fillet10" radius 1 4 edges at (12.5, 5.2, 14) (12.5, 5.2, 12) (2, 5.2, -12) (2, 5.2, -14)
sketch "Sketch31" plane through (3.75, 24.3, 4) normal (0, 0.866, 0.5) x (1, 0, 0)
  line L0 (-0.5, 0) -> (7, 0) projected
  line L1 (0, 0) -> (3.5, 0)
  line L2 (-0.5, 0) -> (7.5, 0) projected
  line L3 (3.5, 0) -> (3.5, -4)
  circle A0 centre (3.5, -4) radius 1.75
  point P0 (-3.75, -8.6859)
  dimension "d200" = 3.5
  dimension "d201" = 4
  dimension "d202" = 3.5
extrude "Extrusion29" cut sketch "Sketch31" against normal blind 2
properties part number "øvre del av kne Andre versjon"
